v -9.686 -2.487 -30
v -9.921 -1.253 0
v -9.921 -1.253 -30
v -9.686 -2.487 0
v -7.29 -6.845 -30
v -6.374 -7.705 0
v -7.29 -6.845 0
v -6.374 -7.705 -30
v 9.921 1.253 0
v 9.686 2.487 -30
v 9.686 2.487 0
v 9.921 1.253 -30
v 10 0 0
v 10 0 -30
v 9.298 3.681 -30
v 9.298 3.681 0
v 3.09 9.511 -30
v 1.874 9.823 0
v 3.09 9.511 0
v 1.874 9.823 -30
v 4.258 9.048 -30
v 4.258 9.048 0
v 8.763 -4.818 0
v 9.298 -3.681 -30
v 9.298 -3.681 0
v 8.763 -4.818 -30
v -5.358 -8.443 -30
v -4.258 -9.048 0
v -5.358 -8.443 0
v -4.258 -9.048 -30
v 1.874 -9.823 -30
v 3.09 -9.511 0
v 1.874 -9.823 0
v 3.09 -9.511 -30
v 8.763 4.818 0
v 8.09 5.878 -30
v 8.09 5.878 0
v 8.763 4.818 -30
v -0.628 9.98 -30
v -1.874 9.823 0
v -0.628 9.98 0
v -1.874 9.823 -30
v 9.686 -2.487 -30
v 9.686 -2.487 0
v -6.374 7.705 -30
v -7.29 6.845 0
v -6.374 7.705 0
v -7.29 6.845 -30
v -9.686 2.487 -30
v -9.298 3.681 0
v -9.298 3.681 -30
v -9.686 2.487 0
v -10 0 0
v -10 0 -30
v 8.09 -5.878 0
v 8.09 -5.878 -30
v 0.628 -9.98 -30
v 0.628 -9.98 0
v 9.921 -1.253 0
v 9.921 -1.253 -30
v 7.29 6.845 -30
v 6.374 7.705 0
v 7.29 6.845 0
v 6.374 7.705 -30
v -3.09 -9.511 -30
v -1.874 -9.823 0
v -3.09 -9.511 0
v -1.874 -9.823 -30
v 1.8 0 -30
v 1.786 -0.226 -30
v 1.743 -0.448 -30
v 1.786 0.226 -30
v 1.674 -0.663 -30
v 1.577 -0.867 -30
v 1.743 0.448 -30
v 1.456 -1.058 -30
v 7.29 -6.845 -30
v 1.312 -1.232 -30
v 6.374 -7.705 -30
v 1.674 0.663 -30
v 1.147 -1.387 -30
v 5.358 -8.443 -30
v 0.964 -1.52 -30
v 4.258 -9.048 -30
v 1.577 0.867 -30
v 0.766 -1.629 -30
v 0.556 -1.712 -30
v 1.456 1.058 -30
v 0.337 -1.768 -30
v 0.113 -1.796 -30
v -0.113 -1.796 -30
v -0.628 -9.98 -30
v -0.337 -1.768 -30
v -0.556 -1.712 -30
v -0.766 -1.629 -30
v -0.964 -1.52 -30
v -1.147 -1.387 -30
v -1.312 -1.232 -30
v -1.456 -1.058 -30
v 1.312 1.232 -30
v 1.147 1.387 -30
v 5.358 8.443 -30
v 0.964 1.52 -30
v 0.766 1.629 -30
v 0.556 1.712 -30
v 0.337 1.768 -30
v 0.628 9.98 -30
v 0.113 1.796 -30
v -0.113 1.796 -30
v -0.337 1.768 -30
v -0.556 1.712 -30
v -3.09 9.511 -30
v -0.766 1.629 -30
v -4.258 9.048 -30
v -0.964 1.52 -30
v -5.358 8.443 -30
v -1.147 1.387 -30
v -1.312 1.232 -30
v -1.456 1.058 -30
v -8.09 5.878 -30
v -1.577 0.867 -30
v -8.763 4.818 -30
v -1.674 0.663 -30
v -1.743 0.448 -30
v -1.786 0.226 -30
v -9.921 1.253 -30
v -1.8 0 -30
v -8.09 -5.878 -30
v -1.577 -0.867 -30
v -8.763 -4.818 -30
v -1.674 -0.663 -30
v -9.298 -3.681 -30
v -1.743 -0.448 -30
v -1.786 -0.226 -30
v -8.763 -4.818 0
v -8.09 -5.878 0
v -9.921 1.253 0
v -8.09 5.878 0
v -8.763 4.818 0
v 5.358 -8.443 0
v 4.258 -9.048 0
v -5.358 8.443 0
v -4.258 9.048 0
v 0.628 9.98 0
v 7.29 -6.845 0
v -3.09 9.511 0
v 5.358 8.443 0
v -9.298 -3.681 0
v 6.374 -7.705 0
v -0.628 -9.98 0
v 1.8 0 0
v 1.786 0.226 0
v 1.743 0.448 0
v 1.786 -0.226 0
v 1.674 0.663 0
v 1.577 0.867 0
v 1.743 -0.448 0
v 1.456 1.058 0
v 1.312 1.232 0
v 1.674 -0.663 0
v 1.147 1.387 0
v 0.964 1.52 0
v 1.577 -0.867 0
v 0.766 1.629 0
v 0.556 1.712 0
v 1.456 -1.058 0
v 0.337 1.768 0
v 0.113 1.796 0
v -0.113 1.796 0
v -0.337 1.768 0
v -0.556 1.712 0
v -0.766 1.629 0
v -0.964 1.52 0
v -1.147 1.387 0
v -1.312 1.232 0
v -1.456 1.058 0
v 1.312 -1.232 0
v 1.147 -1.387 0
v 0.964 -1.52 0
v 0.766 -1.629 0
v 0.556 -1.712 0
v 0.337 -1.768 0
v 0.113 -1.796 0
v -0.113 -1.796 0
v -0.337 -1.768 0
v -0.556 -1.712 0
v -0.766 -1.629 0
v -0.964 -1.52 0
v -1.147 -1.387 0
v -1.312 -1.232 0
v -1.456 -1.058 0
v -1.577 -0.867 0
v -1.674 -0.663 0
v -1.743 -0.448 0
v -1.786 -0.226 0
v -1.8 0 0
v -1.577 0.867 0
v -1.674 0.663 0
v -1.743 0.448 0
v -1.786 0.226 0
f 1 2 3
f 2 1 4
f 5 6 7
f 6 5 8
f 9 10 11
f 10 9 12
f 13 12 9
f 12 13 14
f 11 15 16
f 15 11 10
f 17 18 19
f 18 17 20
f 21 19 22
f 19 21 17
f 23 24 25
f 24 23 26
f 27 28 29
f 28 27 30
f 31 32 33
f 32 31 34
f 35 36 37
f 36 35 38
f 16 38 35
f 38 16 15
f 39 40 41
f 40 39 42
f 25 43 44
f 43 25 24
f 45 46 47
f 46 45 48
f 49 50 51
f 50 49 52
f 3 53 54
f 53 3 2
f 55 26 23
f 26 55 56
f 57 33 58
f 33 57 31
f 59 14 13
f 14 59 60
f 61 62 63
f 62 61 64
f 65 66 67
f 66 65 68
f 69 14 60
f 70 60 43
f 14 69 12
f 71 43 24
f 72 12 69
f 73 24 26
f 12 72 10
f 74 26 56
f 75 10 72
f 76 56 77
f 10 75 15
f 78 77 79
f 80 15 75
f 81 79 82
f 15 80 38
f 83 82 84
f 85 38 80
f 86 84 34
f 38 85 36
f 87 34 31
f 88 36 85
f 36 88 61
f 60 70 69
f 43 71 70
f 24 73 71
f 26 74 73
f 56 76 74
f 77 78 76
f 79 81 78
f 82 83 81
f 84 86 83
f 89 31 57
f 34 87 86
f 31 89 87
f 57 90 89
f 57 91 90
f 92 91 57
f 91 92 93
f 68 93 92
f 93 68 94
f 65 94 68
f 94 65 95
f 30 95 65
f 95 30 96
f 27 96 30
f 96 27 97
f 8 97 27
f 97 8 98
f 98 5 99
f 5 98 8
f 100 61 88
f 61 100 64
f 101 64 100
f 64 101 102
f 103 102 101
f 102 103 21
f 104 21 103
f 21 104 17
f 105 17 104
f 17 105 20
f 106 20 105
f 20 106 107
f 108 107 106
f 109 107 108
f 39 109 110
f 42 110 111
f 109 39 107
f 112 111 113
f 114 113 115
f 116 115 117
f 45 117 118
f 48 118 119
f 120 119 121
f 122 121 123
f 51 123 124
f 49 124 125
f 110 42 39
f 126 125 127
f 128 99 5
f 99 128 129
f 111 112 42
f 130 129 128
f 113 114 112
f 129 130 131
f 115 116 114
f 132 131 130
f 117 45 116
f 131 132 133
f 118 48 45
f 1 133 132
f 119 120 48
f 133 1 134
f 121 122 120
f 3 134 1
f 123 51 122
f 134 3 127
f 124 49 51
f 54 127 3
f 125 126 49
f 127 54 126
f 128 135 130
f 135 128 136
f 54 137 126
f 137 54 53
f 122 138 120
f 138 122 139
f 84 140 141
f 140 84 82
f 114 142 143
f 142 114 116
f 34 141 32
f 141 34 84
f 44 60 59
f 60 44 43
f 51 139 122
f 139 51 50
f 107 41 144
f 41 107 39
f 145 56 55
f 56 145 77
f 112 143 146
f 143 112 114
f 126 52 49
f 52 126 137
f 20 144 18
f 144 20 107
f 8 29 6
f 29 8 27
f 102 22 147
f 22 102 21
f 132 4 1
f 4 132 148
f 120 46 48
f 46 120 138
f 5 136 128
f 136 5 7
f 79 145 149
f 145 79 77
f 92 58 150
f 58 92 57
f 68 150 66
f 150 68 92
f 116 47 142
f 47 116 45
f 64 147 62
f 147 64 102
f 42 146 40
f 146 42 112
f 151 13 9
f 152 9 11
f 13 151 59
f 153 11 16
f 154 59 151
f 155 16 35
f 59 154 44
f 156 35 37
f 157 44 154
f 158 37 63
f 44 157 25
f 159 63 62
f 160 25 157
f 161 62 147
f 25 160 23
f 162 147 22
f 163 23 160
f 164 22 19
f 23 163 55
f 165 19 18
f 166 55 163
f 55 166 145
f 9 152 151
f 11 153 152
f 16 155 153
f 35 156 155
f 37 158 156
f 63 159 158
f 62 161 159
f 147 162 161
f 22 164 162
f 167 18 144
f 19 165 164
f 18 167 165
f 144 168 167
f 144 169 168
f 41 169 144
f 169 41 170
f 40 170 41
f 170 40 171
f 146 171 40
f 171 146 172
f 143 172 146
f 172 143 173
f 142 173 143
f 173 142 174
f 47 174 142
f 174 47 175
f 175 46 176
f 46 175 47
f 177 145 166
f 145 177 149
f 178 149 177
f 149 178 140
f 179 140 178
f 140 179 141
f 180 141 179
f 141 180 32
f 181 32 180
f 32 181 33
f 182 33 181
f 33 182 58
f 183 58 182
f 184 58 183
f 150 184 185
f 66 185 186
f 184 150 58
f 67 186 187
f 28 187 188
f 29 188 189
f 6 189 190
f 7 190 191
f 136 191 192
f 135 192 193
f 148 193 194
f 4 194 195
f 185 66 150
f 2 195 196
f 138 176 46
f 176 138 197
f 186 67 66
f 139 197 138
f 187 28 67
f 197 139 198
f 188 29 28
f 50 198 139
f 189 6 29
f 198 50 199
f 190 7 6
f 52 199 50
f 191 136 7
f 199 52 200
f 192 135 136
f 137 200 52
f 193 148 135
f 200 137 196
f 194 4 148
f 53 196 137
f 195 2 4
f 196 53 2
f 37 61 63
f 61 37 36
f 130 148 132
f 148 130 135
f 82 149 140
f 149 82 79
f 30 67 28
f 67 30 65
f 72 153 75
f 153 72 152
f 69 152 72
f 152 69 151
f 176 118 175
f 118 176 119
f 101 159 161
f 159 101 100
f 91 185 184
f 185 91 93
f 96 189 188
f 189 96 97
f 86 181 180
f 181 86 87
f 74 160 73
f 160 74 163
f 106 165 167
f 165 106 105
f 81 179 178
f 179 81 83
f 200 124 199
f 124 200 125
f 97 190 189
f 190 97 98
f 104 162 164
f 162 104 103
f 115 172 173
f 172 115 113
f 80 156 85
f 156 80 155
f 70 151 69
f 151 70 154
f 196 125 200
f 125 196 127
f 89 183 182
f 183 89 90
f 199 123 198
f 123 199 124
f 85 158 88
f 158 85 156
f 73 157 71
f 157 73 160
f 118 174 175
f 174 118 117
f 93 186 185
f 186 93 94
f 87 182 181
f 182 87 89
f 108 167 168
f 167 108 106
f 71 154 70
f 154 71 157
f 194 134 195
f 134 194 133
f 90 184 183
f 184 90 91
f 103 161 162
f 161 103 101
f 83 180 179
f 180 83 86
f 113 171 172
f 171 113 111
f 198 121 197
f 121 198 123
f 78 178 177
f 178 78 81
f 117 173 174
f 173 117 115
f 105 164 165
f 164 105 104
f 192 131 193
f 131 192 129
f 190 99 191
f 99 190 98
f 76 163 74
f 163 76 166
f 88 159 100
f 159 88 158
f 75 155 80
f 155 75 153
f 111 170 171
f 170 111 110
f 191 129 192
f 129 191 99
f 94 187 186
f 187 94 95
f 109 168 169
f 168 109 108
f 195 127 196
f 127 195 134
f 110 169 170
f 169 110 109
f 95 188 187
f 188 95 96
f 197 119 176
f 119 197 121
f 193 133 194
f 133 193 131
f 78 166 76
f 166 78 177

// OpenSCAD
$fn = 50;


difference() {
	union() {
		translate(v = [0, 0, -30.0000000000]) {
			cylinder(h = 30, r = 10.0000000000);
		}
		cylinder(h = 0, r = 16.0000000000);
	}
	union() {
		#translate(v = [0, 0, -30]) {
			cylinder(h = 30, r = 1.8000000000);
		}
	}
}
